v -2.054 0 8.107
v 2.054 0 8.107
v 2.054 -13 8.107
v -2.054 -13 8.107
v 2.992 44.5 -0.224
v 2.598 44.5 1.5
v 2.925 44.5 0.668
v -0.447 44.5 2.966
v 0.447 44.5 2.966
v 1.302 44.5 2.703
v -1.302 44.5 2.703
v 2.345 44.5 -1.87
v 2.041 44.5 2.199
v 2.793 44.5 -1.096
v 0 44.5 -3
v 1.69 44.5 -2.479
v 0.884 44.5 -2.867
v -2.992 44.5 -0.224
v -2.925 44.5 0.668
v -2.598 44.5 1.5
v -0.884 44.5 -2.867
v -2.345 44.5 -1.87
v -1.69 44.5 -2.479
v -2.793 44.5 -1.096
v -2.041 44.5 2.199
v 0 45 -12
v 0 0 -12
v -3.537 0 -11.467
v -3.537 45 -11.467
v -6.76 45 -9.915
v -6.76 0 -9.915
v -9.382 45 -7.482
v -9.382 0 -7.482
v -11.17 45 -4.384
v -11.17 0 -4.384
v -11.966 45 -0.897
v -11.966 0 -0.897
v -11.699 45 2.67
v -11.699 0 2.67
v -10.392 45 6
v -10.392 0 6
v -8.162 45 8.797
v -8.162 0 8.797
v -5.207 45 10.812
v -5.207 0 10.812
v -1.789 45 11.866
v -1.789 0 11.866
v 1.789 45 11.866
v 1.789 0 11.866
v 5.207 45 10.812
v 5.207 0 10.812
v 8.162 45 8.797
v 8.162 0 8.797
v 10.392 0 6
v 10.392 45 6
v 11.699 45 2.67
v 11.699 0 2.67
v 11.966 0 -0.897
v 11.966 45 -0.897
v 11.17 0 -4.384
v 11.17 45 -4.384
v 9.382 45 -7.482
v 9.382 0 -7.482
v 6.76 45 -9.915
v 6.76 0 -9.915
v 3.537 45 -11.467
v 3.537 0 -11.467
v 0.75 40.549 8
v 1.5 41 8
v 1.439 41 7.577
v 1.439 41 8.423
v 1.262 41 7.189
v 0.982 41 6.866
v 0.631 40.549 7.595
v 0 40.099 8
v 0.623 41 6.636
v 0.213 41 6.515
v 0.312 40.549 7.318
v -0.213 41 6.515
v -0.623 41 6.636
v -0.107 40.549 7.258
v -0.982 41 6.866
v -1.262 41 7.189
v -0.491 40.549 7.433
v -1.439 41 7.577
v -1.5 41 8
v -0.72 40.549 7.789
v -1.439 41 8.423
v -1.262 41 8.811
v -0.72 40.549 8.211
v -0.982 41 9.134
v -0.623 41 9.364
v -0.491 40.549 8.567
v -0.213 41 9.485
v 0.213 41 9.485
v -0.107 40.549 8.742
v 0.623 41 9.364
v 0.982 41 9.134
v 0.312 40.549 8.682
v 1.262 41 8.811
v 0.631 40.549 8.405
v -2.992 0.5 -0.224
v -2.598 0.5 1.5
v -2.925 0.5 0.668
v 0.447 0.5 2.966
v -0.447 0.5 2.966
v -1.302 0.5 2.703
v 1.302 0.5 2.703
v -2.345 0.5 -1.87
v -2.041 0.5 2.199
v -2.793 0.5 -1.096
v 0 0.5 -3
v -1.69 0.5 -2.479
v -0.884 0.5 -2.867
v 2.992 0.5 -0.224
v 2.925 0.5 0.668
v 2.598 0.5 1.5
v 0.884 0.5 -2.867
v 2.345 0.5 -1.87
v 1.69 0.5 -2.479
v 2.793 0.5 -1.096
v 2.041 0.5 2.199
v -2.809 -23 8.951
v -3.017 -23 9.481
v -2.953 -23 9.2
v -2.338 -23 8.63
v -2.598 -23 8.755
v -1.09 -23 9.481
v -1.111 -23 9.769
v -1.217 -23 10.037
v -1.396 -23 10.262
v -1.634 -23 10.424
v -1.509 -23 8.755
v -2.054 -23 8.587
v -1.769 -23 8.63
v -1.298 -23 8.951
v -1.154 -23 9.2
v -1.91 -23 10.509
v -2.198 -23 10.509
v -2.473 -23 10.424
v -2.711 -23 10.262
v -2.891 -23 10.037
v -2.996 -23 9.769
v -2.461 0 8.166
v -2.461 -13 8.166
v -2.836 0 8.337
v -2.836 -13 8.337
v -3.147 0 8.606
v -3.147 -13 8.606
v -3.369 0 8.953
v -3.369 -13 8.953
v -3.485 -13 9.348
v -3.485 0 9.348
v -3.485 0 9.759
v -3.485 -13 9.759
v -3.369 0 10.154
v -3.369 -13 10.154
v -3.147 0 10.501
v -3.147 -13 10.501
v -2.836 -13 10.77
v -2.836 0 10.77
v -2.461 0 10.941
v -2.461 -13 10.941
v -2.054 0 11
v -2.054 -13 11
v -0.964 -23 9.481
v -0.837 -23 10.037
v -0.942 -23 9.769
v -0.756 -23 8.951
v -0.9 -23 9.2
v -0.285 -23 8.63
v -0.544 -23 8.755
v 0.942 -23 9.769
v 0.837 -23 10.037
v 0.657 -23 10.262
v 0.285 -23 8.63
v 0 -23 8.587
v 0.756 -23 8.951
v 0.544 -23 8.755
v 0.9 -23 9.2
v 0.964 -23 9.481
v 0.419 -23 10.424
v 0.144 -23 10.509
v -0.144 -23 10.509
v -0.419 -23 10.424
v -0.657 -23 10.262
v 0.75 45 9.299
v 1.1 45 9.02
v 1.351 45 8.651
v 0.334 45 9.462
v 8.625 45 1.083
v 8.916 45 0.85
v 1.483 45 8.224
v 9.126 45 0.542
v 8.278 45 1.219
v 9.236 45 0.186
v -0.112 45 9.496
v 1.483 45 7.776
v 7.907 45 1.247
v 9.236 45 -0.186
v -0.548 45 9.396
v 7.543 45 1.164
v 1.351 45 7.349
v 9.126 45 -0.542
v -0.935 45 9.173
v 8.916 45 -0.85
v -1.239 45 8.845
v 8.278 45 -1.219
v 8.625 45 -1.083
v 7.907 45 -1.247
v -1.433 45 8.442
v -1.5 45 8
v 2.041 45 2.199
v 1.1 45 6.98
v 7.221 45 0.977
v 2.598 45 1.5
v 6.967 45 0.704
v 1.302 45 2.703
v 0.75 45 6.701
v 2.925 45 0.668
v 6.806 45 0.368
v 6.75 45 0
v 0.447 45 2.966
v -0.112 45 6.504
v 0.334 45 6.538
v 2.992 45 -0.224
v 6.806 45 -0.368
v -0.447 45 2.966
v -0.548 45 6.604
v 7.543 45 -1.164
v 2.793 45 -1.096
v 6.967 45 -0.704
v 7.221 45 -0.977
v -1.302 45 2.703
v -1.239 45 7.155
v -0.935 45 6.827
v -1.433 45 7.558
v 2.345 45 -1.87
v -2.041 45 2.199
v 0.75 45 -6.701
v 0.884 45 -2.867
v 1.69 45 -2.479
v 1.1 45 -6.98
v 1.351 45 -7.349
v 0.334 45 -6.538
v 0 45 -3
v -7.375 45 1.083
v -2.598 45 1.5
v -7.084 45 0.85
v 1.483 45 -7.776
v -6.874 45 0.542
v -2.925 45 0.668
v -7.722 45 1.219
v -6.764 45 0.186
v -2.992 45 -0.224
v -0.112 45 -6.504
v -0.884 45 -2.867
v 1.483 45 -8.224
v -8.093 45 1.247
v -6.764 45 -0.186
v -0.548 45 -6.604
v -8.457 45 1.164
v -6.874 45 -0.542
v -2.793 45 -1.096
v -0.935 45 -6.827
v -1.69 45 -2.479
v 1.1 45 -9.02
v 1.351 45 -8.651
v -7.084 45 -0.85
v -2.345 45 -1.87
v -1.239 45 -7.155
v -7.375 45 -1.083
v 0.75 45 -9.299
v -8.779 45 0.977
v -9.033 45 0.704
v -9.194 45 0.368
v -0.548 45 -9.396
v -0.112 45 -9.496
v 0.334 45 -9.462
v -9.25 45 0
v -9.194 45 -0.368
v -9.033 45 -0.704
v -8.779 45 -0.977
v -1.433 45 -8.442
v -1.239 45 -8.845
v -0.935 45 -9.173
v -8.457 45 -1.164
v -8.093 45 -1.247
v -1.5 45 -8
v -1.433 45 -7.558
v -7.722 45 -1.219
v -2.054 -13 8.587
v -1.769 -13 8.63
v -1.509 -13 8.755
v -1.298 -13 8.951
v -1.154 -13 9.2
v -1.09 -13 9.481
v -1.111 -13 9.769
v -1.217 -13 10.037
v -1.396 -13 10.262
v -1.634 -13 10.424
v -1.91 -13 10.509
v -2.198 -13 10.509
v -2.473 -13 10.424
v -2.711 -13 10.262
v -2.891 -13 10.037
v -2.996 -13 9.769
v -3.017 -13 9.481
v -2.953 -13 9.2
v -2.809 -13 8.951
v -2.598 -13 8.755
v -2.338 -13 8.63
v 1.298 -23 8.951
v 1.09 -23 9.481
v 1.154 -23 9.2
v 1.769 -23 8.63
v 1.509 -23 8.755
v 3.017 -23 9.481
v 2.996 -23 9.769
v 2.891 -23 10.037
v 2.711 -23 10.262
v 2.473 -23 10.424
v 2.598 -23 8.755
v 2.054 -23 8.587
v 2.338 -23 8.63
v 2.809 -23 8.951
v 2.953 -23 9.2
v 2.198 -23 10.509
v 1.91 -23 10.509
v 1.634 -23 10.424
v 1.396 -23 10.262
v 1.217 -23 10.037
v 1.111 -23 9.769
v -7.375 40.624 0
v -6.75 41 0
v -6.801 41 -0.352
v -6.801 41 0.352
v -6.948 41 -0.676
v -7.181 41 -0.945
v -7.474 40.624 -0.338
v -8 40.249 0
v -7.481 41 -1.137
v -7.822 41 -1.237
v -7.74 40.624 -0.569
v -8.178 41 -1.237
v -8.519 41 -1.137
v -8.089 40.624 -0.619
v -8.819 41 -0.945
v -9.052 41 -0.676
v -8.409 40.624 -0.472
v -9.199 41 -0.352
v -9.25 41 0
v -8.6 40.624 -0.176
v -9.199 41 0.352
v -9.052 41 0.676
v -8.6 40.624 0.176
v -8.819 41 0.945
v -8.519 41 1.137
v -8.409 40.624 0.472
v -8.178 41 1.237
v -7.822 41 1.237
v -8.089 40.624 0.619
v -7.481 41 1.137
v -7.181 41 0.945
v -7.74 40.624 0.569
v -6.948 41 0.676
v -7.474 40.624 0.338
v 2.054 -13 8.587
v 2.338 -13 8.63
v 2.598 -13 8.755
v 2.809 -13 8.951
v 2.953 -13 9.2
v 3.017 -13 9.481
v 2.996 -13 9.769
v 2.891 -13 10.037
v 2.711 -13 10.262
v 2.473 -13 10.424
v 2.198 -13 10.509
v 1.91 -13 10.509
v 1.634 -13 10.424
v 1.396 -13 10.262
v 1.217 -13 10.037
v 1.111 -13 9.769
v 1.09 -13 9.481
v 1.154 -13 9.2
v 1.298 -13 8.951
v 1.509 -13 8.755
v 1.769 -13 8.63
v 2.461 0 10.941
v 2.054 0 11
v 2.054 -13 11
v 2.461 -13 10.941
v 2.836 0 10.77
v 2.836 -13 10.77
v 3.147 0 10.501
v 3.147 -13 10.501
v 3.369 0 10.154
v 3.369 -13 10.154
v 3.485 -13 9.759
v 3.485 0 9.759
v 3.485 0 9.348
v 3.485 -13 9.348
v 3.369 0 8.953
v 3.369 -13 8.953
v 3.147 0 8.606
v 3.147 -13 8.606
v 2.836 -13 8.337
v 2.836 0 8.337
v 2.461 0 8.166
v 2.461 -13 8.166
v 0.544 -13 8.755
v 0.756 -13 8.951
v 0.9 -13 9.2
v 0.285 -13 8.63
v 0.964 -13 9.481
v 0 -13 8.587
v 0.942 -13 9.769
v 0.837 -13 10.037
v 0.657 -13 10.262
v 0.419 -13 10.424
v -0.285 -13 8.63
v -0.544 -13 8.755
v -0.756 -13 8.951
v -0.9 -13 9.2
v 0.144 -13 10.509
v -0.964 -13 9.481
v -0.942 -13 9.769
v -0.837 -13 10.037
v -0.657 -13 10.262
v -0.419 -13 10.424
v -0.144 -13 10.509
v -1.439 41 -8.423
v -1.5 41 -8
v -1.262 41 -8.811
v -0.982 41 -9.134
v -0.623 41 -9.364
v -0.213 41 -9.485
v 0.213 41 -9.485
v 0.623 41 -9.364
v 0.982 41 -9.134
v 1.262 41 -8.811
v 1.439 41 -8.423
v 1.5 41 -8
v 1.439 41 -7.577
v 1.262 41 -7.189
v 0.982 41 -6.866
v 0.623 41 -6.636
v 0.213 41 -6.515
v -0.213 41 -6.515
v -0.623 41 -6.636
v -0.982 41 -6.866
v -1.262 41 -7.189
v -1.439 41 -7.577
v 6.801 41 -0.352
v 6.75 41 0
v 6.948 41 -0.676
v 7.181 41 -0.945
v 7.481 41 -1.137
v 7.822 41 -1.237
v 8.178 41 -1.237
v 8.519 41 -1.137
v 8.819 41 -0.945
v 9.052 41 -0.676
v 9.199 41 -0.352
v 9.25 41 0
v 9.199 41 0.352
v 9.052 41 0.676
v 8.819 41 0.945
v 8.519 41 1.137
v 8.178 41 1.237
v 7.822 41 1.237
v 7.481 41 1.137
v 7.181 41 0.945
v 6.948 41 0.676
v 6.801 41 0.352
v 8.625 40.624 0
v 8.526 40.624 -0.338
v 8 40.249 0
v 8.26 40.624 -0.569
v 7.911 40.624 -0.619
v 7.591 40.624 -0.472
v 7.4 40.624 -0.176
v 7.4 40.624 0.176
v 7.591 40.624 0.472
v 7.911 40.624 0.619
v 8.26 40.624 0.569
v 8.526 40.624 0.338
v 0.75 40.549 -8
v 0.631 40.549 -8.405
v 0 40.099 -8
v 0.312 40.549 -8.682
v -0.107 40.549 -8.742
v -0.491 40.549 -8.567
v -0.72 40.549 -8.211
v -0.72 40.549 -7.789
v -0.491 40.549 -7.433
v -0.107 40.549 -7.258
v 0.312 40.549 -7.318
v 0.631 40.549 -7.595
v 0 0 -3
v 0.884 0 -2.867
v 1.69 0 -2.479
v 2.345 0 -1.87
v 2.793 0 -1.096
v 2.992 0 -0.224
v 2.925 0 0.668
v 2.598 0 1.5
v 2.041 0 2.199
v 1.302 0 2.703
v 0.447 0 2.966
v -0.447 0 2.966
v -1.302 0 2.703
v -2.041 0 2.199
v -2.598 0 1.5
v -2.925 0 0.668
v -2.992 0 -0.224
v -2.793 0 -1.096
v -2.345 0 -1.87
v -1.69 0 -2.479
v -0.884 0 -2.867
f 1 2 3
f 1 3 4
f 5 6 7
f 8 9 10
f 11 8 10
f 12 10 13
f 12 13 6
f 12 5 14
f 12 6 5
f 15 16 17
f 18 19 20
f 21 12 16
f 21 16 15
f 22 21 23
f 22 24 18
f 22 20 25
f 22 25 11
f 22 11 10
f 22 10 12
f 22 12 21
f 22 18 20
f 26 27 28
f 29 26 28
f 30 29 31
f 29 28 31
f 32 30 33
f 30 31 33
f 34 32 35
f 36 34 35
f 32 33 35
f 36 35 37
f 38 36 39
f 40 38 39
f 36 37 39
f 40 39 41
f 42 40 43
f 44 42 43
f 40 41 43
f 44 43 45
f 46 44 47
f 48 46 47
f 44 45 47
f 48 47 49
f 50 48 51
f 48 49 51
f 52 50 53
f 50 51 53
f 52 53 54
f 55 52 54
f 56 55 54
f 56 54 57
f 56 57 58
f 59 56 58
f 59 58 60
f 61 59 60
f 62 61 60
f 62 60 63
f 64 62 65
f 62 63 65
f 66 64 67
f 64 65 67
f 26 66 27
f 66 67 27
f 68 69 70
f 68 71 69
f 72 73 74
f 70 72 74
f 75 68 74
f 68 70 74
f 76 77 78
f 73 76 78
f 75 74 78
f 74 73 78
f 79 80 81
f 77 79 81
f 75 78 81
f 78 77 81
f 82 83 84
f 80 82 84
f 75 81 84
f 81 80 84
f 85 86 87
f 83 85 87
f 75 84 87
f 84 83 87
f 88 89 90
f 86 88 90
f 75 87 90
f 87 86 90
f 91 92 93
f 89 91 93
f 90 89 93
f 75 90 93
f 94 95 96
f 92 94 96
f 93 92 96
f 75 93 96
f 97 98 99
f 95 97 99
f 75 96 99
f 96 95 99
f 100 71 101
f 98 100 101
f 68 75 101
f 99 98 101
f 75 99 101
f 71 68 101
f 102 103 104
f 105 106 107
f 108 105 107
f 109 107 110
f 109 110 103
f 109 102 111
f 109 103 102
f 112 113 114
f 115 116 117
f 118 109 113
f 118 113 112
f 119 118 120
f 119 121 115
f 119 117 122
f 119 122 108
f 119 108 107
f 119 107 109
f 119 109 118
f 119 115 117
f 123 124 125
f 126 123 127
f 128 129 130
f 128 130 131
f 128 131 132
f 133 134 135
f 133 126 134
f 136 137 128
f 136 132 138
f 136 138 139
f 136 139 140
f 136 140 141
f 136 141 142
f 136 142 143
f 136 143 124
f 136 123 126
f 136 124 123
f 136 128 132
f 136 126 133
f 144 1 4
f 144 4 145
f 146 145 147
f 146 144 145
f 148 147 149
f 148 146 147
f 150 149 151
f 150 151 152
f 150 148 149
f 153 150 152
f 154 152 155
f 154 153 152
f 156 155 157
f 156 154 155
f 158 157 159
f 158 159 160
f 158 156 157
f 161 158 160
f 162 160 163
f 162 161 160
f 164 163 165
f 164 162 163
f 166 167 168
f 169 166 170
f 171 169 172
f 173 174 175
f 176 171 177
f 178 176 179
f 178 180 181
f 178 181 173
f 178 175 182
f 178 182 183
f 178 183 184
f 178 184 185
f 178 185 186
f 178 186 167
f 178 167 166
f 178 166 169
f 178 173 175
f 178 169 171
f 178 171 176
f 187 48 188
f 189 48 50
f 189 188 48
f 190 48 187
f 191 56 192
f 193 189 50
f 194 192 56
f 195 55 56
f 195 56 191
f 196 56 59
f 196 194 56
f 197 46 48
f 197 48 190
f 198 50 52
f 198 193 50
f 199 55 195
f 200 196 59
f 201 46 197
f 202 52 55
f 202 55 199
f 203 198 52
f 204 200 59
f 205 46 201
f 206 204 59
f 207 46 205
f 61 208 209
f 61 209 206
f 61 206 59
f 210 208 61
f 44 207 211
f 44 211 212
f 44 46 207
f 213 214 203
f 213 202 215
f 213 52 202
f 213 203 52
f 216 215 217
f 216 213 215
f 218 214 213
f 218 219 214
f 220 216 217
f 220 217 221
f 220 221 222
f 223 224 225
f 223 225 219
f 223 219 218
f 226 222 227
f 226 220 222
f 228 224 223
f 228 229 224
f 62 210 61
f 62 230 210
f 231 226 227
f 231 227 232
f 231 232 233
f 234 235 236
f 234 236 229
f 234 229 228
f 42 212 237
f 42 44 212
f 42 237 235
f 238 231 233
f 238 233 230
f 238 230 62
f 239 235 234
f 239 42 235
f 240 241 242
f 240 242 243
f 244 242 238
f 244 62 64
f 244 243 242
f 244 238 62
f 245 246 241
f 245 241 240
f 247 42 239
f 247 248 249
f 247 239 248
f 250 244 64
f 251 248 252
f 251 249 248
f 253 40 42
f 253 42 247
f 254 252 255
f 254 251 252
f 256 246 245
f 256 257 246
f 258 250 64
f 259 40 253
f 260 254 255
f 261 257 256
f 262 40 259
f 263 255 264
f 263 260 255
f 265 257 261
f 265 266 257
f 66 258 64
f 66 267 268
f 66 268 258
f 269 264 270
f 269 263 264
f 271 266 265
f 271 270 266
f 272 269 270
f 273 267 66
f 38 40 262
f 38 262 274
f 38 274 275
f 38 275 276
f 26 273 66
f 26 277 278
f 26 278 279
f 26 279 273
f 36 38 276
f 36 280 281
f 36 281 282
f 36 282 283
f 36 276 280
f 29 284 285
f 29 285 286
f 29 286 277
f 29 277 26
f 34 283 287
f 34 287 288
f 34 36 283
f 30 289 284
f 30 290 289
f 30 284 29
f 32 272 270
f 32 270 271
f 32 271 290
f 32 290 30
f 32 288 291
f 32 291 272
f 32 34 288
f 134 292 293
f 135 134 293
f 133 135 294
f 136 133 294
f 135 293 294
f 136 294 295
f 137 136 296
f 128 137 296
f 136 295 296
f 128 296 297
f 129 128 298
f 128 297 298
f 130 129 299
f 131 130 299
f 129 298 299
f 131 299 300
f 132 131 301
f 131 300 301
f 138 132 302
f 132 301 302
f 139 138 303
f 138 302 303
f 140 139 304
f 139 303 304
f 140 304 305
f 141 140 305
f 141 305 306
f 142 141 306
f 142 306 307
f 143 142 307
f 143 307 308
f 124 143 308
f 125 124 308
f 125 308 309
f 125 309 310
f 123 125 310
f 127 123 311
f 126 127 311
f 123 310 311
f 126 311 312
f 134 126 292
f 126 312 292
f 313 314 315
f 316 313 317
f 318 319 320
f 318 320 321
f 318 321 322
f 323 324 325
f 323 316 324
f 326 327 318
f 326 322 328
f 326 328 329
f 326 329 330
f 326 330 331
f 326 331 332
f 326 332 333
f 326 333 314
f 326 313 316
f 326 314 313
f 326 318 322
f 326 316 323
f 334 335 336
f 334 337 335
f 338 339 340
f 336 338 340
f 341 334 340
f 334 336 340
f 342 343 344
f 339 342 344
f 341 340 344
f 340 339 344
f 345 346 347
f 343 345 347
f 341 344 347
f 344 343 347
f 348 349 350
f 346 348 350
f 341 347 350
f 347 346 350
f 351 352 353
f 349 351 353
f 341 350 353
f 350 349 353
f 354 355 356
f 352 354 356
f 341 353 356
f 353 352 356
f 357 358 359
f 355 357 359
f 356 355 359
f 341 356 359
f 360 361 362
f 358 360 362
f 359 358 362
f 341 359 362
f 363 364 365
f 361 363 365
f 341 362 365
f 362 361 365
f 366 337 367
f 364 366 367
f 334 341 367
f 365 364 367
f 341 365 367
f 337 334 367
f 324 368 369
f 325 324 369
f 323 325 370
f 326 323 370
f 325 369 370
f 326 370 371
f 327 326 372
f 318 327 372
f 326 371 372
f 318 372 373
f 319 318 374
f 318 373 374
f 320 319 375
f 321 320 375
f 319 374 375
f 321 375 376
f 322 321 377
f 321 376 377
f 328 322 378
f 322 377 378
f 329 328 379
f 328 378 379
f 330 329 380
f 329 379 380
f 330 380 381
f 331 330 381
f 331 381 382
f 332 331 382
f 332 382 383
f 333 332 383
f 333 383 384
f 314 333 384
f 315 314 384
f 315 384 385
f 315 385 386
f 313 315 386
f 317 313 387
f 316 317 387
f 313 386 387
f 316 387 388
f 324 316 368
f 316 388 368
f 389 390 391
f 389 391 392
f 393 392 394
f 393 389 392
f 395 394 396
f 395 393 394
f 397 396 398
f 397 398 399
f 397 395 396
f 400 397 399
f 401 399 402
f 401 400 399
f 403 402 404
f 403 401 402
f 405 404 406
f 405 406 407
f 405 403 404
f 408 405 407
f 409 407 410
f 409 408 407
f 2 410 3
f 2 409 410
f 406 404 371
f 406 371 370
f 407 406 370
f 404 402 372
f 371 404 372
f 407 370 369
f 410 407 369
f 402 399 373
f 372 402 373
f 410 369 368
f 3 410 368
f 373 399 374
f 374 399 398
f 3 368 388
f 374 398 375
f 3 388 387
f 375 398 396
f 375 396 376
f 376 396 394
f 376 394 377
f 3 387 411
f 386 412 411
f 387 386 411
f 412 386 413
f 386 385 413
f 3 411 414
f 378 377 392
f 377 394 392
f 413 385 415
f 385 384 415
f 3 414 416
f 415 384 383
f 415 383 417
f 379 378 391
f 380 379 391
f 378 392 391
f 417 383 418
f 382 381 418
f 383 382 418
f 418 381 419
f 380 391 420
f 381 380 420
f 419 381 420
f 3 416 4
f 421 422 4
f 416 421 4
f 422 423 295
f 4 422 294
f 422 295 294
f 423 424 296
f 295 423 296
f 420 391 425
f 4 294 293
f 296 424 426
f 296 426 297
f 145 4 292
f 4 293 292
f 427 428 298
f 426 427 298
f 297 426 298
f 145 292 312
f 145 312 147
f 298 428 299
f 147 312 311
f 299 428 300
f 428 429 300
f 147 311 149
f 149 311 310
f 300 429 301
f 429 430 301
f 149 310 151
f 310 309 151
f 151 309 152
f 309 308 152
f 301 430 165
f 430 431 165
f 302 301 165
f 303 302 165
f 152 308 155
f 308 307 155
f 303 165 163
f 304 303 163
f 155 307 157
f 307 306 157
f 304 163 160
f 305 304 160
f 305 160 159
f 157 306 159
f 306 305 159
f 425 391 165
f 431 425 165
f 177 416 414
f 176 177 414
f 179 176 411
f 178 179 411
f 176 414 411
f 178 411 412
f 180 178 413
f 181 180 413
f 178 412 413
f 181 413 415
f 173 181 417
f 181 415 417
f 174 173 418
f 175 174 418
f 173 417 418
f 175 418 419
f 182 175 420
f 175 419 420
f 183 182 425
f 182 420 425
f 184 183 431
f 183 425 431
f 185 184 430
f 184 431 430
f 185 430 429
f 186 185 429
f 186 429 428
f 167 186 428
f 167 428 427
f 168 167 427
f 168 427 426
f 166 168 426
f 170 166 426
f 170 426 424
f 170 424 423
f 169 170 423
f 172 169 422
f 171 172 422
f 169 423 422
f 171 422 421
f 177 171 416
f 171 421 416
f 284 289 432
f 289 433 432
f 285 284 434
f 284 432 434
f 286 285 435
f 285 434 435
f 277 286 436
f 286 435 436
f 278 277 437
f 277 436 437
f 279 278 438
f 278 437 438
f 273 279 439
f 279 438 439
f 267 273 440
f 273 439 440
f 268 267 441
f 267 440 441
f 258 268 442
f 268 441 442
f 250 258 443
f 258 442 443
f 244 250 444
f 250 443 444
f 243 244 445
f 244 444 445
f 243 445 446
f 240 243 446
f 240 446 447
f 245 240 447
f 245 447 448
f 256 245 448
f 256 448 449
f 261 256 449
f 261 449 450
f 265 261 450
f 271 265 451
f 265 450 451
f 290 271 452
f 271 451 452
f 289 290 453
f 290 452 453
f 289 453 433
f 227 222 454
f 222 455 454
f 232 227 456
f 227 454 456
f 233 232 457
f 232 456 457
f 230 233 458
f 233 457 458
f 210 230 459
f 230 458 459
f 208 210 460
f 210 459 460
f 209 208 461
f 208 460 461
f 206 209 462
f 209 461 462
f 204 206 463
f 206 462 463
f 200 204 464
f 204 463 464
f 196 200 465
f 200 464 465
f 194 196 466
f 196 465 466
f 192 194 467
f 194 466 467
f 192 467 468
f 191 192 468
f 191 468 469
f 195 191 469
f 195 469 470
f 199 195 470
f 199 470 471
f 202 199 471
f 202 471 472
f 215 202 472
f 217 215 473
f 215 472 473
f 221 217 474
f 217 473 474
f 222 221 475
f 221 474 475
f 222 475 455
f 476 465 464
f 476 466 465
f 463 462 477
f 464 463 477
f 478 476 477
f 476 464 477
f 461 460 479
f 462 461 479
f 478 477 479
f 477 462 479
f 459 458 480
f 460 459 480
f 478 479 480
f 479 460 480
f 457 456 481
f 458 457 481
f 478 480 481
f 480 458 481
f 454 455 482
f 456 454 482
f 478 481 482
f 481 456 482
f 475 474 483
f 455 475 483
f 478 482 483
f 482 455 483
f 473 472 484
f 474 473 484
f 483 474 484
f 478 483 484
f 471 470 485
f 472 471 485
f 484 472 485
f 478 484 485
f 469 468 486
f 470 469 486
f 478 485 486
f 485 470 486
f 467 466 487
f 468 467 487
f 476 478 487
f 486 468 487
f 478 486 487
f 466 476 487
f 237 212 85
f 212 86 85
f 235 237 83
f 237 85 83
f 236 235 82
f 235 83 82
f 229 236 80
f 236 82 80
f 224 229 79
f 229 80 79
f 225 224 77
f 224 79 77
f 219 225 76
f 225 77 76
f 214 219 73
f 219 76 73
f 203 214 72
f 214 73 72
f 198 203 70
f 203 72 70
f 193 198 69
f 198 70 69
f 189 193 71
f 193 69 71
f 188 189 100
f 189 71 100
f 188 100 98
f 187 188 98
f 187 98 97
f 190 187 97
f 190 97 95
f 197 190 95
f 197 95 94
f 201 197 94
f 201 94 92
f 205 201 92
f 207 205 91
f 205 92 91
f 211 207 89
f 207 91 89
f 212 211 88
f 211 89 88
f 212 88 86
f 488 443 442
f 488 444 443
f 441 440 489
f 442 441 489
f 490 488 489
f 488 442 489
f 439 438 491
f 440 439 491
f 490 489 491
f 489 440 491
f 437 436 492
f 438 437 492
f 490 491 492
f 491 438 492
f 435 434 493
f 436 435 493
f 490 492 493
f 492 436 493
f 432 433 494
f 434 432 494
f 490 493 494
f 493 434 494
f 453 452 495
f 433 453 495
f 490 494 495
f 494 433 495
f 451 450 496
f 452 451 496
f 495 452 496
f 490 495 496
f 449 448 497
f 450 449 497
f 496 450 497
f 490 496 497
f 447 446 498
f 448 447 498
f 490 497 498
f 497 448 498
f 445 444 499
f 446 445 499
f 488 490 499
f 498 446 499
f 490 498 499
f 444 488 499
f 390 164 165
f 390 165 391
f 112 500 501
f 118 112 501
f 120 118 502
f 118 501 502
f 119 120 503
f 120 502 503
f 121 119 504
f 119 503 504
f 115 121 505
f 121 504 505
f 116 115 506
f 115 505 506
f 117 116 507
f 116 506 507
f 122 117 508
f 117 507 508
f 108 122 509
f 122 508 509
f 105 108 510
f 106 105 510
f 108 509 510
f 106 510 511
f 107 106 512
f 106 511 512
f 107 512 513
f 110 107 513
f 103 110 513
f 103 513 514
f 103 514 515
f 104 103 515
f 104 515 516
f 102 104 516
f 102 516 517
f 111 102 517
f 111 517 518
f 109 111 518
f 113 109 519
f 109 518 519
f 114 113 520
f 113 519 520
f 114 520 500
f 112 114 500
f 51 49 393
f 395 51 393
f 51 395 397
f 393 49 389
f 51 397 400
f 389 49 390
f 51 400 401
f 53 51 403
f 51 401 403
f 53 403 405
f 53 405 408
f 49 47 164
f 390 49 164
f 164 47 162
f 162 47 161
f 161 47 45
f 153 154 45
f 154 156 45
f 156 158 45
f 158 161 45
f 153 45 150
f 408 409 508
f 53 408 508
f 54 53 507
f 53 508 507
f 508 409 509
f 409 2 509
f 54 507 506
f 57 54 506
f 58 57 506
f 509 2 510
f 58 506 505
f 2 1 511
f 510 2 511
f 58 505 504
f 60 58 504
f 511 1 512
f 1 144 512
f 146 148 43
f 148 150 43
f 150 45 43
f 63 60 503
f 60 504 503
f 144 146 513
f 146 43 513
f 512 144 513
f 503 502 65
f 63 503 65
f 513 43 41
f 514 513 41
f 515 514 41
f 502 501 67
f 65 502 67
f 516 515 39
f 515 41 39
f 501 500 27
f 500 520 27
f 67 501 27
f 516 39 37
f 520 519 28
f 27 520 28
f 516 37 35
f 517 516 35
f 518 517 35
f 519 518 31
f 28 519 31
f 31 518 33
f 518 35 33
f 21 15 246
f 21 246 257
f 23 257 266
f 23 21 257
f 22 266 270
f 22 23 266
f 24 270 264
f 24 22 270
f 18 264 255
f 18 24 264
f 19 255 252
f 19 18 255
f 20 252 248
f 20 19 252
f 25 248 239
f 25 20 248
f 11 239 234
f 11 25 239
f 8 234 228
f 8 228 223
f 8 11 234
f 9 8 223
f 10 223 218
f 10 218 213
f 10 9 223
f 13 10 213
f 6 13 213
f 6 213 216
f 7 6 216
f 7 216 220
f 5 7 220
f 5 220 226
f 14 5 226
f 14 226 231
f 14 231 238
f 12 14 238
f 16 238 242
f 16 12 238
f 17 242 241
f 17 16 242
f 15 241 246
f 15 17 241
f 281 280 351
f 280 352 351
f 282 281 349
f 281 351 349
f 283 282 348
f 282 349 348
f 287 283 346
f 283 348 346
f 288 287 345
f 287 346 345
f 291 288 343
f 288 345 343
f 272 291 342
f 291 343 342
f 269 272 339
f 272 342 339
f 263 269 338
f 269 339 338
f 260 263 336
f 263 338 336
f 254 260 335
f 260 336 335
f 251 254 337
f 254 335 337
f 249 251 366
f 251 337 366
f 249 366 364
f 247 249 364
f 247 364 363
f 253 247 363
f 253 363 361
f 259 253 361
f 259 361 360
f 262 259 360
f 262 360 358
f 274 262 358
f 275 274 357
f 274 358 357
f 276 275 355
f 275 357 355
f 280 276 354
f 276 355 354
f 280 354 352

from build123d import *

# Parameters (mm, degrees)
SKETCH1_R              = 12
MOTORCASE_DEPTH        = 45
HOLE_WIZARD_M2_5_D     = 2.5
HOLE_WIZARD_M2_5_DEPTH = 4
HOLE_WIZARD_M2_5_TIP   = 0.751075774
HOLE_WIZARD_M3_D       = 3
HOLE_WIZARD_M3_DEPTH   = 4
HOLE_WIZARD_M3_TIP     = 0.901290929
BOSS_EXTRUDE1_DEPTH    = 13
SKETCH15_R             = 0.966568062
BOSS_EXTRUDE2_DEPTH    = 10
SKETCH16_R             = 3
CUT_EXTRUDE2_DEPTH     = 0.5
CUT_EXTRUDE3_START     = -0.5
SKETCH17_R             = 3
CUT_EXTRUDE3_DEPTH     = 0.5


with BuildPart() as part:
    # Sketch1 → MotorCase (new body)
    with BuildSketch(Plane(origin=(0, 0, 0), x_dir=(1, 0, 0), z_dir=(0, 1, 0))):
        with Locations(Location((0, 0, 0), (0, 0, 90))):
            Circle(SKETCH1_R)
    extrude(amount=MOTORCASE_DEPTH)

    # Hole Wizard M2.5
    with Locations(Plane(origin=(0, 45, 0), x_dir=(1, 0, 0), z_dir=(0, 1, 0))):
        with Locations((8, 0), (-8, 0)):
            Hole(HOLE_WIZARD_M2_5_D / 2, depth=HOLE_WIZARD_M2_5_DEPTH)
            with Locations((0, 0, -(HOLE_WIZARD_M2_5_DEPTH + HOLE_WIZARD_M2_5_TIP / 2))):  # 118° drill point
                Cone(0, HOLE_WIZARD_M2_5_D / 2, HOLE_WIZARD_M2_5_TIP, mode=Mode.SUBTRACT)

    # Hole Wizard M3
    with Locations(Plane(origin=(0, 45, 0), x_dir=(1, 0, 0), z_dir=(0, 1, 0))):
        with Locations((0, 8), (0, -8)):
            Hole(HOLE_WIZARD_M3_D / 2, depth=HOLE_WIZARD_M3_DEPTH)
            with Locations((0, 0, -(HOLE_WIZARD_M3_DEPTH + HOLE_WIZARD_M3_TIP / 2))):  # 118° drill point
                Cone(0, HOLE_WIZARD_M3_D / 2, HOLE_WIZARD_M3_TIP, mode=Mode.SUBTRACT)

    # Sketch14 → Boss-Extrude1 (add)
    with BuildSketch(Plane.XZ):
        with BuildLine():
            Line((-2.053579932, 11), (2.053579932, 11))
            ThreePointArc((2.053579932, 11), (3.5, 9.553579932), (2.053579932, 8.107159865))
            Line((2.053579932, 8.107159865), (-2.053579932, 8.107159865))
            ThreePointArc((-2.053579932, 8.107159865), (-3.5, 9.553579932), (-2.053579932, 11))
        make_face()
    extrude(amount=BOSS_EXTRUDE1_DEPTH)

    # Sketch15 → Boss-Extrude2 (add)
    with BuildSketch(Plane.XZ.offset(13)):
        with Locations(Location((-2.053579932, 9.553579932, 0), (0, 0, 270))):
            Circle(SKETCH15_R)
        with Locations(Location((0, 9.553579932, 0), (0, 0, 270))):
            Circle(SKETCH15_R)
        with Locations(Location((2.053579932, 9.553579932, 0), (0, 0, 270))):
            Circle(SKETCH15_R)
    extrude(amount=BOSS_EXTRUDE2_DEPTH)

    # Sketch16 → Cut-Extrude2 (cut)
    with BuildSketch(Plane.XZ):
        with Locations(Location((0, 0, 0), (0, 0, 270))):
            Circle(SKETCH16_R)
    extrude(amount=-CUT_EXTRUDE2_DEPTH, mode=Mode.SUBTRACT)

    # Sketch17 → Cut-Extrude3 (cut)
    with BuildSketch(Plane(origin=(0, 45, 0), x_dir=(1, 0, 0), z_dir=(0, 1, 0)).offset(CUT_EXTRUDE3_START)):
        with Locations(Location((0, 0, 0), (0, 0, 90))):
            Circle(SKETCH17_R)
    extrude(amount=CUT_EXTRUDE3_DEPTH, mode=Mode.SUBTRACT)


solid = part.part
